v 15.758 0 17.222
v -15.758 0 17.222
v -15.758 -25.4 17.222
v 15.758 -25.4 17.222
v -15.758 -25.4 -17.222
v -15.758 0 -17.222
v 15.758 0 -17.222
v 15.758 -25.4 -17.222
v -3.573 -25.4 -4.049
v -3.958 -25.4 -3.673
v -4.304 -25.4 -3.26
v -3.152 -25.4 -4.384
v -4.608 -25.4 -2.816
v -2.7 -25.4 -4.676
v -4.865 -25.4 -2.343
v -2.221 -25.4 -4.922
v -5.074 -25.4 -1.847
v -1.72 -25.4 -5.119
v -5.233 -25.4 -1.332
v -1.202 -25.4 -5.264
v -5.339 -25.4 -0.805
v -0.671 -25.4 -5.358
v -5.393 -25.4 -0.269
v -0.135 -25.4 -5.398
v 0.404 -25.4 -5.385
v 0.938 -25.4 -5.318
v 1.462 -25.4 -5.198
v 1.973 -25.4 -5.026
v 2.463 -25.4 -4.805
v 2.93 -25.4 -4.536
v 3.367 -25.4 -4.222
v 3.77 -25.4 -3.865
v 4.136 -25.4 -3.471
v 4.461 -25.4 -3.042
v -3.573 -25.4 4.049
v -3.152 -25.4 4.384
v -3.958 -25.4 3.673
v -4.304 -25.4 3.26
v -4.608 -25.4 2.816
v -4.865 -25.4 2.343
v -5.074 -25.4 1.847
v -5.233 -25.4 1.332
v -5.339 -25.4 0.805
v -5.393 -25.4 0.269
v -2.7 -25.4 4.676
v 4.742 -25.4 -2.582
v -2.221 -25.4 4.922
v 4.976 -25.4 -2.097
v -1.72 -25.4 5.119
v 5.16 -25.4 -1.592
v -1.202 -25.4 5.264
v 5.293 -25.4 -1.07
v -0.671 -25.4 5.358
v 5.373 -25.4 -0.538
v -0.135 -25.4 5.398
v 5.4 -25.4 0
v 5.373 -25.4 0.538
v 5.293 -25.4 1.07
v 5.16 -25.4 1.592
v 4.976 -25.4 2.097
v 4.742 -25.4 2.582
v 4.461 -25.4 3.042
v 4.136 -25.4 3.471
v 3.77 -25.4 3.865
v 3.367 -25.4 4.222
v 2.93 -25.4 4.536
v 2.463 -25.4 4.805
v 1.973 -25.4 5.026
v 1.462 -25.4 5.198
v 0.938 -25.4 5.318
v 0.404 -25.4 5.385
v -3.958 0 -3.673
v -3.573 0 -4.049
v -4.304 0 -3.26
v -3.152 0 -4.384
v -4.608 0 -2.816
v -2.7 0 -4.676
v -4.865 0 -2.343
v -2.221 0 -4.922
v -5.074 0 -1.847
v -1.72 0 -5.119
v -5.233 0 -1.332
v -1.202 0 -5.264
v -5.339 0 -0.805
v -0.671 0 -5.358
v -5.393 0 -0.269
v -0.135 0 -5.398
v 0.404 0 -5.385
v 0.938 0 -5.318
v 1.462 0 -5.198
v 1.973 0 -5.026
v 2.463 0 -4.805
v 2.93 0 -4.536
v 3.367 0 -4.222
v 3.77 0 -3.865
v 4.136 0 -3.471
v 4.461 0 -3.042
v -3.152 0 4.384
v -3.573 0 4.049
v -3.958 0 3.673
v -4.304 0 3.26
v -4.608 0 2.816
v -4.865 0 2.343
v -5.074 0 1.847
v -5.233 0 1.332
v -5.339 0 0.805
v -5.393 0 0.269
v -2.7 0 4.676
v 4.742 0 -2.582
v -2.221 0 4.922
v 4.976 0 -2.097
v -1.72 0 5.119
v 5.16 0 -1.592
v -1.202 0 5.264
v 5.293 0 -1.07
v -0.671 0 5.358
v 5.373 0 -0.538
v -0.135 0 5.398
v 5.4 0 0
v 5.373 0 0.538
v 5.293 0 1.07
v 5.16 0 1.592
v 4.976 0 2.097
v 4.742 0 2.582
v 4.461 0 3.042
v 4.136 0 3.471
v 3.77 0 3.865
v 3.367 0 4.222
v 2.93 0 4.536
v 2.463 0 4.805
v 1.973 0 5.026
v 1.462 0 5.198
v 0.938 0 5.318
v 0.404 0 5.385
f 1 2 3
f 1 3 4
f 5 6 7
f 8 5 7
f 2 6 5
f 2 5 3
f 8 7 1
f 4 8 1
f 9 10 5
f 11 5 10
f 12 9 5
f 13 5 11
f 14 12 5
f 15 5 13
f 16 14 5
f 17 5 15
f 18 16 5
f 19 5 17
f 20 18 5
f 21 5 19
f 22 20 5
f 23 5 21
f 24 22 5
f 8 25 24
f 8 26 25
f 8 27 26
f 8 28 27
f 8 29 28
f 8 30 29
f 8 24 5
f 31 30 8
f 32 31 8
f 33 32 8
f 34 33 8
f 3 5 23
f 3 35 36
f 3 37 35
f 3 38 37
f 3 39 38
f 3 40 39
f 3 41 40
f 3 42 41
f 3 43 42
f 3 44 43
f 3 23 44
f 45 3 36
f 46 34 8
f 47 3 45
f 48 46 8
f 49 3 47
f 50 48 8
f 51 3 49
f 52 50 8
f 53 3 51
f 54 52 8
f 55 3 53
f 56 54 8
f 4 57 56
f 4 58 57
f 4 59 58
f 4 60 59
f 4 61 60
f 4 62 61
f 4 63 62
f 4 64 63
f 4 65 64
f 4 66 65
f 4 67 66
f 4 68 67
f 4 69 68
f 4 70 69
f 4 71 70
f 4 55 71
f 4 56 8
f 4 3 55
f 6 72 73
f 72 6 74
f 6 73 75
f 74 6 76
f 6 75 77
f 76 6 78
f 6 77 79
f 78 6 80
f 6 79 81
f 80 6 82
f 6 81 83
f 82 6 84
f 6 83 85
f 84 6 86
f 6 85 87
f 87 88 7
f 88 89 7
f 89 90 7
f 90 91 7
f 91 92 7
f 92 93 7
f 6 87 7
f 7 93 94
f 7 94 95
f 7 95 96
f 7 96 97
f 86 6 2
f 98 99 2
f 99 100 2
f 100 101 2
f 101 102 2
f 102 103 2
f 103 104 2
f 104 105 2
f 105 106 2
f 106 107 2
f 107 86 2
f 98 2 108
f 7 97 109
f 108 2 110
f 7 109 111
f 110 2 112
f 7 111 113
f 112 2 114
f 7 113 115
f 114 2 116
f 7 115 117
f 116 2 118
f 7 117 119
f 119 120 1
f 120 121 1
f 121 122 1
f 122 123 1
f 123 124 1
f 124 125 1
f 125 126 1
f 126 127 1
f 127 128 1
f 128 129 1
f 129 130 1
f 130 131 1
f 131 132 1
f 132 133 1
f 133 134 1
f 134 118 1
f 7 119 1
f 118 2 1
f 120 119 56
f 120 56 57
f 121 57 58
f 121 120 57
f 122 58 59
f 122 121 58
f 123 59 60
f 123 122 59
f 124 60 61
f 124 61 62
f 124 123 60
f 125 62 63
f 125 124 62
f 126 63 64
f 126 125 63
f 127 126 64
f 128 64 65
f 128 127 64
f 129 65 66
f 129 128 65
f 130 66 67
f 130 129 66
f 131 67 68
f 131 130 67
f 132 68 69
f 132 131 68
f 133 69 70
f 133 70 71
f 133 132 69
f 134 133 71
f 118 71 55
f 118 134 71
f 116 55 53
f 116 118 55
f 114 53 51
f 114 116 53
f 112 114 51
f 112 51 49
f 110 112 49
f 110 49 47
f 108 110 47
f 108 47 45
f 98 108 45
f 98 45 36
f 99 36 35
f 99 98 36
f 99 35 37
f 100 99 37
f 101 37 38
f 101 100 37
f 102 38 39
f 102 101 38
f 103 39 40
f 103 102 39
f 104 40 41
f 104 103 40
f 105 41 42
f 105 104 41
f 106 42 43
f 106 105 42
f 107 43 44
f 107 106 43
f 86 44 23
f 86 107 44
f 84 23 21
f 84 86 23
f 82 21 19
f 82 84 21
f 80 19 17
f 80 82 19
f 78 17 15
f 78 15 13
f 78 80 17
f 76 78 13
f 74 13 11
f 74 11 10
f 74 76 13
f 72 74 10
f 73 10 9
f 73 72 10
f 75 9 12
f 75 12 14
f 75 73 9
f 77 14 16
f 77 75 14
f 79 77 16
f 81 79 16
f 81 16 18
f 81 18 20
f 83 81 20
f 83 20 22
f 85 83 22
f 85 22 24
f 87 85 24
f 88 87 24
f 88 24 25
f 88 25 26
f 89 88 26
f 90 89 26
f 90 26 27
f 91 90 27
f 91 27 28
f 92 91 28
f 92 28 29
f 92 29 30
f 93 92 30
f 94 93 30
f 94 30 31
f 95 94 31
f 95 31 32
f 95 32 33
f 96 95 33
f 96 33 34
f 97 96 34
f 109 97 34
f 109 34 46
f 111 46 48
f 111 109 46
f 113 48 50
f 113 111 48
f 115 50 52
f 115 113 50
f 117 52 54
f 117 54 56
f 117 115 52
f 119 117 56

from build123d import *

# Parameters (mm, degrees)
F0_W     = 31.5161347389
F0_H     = 34.4433300197
F0_R     = 5.3996855878
F1_DEPTH = 25.4


# Not quite as in the source:
# - the program builds the solid bodies; features that only make, move or delete a surface that nothing else refers to are left out


with BuildPart() as f1:
    # F0 (on Front) → F1 (new body)
    with BuildSketch(Plane.XZ):
        Rectangle(F0_W, F0_H)
        Circle(F0_R, mode=Mode.SUBTRACT)
    extrude(amount=F1_DEPTH)


solid = f1.part
